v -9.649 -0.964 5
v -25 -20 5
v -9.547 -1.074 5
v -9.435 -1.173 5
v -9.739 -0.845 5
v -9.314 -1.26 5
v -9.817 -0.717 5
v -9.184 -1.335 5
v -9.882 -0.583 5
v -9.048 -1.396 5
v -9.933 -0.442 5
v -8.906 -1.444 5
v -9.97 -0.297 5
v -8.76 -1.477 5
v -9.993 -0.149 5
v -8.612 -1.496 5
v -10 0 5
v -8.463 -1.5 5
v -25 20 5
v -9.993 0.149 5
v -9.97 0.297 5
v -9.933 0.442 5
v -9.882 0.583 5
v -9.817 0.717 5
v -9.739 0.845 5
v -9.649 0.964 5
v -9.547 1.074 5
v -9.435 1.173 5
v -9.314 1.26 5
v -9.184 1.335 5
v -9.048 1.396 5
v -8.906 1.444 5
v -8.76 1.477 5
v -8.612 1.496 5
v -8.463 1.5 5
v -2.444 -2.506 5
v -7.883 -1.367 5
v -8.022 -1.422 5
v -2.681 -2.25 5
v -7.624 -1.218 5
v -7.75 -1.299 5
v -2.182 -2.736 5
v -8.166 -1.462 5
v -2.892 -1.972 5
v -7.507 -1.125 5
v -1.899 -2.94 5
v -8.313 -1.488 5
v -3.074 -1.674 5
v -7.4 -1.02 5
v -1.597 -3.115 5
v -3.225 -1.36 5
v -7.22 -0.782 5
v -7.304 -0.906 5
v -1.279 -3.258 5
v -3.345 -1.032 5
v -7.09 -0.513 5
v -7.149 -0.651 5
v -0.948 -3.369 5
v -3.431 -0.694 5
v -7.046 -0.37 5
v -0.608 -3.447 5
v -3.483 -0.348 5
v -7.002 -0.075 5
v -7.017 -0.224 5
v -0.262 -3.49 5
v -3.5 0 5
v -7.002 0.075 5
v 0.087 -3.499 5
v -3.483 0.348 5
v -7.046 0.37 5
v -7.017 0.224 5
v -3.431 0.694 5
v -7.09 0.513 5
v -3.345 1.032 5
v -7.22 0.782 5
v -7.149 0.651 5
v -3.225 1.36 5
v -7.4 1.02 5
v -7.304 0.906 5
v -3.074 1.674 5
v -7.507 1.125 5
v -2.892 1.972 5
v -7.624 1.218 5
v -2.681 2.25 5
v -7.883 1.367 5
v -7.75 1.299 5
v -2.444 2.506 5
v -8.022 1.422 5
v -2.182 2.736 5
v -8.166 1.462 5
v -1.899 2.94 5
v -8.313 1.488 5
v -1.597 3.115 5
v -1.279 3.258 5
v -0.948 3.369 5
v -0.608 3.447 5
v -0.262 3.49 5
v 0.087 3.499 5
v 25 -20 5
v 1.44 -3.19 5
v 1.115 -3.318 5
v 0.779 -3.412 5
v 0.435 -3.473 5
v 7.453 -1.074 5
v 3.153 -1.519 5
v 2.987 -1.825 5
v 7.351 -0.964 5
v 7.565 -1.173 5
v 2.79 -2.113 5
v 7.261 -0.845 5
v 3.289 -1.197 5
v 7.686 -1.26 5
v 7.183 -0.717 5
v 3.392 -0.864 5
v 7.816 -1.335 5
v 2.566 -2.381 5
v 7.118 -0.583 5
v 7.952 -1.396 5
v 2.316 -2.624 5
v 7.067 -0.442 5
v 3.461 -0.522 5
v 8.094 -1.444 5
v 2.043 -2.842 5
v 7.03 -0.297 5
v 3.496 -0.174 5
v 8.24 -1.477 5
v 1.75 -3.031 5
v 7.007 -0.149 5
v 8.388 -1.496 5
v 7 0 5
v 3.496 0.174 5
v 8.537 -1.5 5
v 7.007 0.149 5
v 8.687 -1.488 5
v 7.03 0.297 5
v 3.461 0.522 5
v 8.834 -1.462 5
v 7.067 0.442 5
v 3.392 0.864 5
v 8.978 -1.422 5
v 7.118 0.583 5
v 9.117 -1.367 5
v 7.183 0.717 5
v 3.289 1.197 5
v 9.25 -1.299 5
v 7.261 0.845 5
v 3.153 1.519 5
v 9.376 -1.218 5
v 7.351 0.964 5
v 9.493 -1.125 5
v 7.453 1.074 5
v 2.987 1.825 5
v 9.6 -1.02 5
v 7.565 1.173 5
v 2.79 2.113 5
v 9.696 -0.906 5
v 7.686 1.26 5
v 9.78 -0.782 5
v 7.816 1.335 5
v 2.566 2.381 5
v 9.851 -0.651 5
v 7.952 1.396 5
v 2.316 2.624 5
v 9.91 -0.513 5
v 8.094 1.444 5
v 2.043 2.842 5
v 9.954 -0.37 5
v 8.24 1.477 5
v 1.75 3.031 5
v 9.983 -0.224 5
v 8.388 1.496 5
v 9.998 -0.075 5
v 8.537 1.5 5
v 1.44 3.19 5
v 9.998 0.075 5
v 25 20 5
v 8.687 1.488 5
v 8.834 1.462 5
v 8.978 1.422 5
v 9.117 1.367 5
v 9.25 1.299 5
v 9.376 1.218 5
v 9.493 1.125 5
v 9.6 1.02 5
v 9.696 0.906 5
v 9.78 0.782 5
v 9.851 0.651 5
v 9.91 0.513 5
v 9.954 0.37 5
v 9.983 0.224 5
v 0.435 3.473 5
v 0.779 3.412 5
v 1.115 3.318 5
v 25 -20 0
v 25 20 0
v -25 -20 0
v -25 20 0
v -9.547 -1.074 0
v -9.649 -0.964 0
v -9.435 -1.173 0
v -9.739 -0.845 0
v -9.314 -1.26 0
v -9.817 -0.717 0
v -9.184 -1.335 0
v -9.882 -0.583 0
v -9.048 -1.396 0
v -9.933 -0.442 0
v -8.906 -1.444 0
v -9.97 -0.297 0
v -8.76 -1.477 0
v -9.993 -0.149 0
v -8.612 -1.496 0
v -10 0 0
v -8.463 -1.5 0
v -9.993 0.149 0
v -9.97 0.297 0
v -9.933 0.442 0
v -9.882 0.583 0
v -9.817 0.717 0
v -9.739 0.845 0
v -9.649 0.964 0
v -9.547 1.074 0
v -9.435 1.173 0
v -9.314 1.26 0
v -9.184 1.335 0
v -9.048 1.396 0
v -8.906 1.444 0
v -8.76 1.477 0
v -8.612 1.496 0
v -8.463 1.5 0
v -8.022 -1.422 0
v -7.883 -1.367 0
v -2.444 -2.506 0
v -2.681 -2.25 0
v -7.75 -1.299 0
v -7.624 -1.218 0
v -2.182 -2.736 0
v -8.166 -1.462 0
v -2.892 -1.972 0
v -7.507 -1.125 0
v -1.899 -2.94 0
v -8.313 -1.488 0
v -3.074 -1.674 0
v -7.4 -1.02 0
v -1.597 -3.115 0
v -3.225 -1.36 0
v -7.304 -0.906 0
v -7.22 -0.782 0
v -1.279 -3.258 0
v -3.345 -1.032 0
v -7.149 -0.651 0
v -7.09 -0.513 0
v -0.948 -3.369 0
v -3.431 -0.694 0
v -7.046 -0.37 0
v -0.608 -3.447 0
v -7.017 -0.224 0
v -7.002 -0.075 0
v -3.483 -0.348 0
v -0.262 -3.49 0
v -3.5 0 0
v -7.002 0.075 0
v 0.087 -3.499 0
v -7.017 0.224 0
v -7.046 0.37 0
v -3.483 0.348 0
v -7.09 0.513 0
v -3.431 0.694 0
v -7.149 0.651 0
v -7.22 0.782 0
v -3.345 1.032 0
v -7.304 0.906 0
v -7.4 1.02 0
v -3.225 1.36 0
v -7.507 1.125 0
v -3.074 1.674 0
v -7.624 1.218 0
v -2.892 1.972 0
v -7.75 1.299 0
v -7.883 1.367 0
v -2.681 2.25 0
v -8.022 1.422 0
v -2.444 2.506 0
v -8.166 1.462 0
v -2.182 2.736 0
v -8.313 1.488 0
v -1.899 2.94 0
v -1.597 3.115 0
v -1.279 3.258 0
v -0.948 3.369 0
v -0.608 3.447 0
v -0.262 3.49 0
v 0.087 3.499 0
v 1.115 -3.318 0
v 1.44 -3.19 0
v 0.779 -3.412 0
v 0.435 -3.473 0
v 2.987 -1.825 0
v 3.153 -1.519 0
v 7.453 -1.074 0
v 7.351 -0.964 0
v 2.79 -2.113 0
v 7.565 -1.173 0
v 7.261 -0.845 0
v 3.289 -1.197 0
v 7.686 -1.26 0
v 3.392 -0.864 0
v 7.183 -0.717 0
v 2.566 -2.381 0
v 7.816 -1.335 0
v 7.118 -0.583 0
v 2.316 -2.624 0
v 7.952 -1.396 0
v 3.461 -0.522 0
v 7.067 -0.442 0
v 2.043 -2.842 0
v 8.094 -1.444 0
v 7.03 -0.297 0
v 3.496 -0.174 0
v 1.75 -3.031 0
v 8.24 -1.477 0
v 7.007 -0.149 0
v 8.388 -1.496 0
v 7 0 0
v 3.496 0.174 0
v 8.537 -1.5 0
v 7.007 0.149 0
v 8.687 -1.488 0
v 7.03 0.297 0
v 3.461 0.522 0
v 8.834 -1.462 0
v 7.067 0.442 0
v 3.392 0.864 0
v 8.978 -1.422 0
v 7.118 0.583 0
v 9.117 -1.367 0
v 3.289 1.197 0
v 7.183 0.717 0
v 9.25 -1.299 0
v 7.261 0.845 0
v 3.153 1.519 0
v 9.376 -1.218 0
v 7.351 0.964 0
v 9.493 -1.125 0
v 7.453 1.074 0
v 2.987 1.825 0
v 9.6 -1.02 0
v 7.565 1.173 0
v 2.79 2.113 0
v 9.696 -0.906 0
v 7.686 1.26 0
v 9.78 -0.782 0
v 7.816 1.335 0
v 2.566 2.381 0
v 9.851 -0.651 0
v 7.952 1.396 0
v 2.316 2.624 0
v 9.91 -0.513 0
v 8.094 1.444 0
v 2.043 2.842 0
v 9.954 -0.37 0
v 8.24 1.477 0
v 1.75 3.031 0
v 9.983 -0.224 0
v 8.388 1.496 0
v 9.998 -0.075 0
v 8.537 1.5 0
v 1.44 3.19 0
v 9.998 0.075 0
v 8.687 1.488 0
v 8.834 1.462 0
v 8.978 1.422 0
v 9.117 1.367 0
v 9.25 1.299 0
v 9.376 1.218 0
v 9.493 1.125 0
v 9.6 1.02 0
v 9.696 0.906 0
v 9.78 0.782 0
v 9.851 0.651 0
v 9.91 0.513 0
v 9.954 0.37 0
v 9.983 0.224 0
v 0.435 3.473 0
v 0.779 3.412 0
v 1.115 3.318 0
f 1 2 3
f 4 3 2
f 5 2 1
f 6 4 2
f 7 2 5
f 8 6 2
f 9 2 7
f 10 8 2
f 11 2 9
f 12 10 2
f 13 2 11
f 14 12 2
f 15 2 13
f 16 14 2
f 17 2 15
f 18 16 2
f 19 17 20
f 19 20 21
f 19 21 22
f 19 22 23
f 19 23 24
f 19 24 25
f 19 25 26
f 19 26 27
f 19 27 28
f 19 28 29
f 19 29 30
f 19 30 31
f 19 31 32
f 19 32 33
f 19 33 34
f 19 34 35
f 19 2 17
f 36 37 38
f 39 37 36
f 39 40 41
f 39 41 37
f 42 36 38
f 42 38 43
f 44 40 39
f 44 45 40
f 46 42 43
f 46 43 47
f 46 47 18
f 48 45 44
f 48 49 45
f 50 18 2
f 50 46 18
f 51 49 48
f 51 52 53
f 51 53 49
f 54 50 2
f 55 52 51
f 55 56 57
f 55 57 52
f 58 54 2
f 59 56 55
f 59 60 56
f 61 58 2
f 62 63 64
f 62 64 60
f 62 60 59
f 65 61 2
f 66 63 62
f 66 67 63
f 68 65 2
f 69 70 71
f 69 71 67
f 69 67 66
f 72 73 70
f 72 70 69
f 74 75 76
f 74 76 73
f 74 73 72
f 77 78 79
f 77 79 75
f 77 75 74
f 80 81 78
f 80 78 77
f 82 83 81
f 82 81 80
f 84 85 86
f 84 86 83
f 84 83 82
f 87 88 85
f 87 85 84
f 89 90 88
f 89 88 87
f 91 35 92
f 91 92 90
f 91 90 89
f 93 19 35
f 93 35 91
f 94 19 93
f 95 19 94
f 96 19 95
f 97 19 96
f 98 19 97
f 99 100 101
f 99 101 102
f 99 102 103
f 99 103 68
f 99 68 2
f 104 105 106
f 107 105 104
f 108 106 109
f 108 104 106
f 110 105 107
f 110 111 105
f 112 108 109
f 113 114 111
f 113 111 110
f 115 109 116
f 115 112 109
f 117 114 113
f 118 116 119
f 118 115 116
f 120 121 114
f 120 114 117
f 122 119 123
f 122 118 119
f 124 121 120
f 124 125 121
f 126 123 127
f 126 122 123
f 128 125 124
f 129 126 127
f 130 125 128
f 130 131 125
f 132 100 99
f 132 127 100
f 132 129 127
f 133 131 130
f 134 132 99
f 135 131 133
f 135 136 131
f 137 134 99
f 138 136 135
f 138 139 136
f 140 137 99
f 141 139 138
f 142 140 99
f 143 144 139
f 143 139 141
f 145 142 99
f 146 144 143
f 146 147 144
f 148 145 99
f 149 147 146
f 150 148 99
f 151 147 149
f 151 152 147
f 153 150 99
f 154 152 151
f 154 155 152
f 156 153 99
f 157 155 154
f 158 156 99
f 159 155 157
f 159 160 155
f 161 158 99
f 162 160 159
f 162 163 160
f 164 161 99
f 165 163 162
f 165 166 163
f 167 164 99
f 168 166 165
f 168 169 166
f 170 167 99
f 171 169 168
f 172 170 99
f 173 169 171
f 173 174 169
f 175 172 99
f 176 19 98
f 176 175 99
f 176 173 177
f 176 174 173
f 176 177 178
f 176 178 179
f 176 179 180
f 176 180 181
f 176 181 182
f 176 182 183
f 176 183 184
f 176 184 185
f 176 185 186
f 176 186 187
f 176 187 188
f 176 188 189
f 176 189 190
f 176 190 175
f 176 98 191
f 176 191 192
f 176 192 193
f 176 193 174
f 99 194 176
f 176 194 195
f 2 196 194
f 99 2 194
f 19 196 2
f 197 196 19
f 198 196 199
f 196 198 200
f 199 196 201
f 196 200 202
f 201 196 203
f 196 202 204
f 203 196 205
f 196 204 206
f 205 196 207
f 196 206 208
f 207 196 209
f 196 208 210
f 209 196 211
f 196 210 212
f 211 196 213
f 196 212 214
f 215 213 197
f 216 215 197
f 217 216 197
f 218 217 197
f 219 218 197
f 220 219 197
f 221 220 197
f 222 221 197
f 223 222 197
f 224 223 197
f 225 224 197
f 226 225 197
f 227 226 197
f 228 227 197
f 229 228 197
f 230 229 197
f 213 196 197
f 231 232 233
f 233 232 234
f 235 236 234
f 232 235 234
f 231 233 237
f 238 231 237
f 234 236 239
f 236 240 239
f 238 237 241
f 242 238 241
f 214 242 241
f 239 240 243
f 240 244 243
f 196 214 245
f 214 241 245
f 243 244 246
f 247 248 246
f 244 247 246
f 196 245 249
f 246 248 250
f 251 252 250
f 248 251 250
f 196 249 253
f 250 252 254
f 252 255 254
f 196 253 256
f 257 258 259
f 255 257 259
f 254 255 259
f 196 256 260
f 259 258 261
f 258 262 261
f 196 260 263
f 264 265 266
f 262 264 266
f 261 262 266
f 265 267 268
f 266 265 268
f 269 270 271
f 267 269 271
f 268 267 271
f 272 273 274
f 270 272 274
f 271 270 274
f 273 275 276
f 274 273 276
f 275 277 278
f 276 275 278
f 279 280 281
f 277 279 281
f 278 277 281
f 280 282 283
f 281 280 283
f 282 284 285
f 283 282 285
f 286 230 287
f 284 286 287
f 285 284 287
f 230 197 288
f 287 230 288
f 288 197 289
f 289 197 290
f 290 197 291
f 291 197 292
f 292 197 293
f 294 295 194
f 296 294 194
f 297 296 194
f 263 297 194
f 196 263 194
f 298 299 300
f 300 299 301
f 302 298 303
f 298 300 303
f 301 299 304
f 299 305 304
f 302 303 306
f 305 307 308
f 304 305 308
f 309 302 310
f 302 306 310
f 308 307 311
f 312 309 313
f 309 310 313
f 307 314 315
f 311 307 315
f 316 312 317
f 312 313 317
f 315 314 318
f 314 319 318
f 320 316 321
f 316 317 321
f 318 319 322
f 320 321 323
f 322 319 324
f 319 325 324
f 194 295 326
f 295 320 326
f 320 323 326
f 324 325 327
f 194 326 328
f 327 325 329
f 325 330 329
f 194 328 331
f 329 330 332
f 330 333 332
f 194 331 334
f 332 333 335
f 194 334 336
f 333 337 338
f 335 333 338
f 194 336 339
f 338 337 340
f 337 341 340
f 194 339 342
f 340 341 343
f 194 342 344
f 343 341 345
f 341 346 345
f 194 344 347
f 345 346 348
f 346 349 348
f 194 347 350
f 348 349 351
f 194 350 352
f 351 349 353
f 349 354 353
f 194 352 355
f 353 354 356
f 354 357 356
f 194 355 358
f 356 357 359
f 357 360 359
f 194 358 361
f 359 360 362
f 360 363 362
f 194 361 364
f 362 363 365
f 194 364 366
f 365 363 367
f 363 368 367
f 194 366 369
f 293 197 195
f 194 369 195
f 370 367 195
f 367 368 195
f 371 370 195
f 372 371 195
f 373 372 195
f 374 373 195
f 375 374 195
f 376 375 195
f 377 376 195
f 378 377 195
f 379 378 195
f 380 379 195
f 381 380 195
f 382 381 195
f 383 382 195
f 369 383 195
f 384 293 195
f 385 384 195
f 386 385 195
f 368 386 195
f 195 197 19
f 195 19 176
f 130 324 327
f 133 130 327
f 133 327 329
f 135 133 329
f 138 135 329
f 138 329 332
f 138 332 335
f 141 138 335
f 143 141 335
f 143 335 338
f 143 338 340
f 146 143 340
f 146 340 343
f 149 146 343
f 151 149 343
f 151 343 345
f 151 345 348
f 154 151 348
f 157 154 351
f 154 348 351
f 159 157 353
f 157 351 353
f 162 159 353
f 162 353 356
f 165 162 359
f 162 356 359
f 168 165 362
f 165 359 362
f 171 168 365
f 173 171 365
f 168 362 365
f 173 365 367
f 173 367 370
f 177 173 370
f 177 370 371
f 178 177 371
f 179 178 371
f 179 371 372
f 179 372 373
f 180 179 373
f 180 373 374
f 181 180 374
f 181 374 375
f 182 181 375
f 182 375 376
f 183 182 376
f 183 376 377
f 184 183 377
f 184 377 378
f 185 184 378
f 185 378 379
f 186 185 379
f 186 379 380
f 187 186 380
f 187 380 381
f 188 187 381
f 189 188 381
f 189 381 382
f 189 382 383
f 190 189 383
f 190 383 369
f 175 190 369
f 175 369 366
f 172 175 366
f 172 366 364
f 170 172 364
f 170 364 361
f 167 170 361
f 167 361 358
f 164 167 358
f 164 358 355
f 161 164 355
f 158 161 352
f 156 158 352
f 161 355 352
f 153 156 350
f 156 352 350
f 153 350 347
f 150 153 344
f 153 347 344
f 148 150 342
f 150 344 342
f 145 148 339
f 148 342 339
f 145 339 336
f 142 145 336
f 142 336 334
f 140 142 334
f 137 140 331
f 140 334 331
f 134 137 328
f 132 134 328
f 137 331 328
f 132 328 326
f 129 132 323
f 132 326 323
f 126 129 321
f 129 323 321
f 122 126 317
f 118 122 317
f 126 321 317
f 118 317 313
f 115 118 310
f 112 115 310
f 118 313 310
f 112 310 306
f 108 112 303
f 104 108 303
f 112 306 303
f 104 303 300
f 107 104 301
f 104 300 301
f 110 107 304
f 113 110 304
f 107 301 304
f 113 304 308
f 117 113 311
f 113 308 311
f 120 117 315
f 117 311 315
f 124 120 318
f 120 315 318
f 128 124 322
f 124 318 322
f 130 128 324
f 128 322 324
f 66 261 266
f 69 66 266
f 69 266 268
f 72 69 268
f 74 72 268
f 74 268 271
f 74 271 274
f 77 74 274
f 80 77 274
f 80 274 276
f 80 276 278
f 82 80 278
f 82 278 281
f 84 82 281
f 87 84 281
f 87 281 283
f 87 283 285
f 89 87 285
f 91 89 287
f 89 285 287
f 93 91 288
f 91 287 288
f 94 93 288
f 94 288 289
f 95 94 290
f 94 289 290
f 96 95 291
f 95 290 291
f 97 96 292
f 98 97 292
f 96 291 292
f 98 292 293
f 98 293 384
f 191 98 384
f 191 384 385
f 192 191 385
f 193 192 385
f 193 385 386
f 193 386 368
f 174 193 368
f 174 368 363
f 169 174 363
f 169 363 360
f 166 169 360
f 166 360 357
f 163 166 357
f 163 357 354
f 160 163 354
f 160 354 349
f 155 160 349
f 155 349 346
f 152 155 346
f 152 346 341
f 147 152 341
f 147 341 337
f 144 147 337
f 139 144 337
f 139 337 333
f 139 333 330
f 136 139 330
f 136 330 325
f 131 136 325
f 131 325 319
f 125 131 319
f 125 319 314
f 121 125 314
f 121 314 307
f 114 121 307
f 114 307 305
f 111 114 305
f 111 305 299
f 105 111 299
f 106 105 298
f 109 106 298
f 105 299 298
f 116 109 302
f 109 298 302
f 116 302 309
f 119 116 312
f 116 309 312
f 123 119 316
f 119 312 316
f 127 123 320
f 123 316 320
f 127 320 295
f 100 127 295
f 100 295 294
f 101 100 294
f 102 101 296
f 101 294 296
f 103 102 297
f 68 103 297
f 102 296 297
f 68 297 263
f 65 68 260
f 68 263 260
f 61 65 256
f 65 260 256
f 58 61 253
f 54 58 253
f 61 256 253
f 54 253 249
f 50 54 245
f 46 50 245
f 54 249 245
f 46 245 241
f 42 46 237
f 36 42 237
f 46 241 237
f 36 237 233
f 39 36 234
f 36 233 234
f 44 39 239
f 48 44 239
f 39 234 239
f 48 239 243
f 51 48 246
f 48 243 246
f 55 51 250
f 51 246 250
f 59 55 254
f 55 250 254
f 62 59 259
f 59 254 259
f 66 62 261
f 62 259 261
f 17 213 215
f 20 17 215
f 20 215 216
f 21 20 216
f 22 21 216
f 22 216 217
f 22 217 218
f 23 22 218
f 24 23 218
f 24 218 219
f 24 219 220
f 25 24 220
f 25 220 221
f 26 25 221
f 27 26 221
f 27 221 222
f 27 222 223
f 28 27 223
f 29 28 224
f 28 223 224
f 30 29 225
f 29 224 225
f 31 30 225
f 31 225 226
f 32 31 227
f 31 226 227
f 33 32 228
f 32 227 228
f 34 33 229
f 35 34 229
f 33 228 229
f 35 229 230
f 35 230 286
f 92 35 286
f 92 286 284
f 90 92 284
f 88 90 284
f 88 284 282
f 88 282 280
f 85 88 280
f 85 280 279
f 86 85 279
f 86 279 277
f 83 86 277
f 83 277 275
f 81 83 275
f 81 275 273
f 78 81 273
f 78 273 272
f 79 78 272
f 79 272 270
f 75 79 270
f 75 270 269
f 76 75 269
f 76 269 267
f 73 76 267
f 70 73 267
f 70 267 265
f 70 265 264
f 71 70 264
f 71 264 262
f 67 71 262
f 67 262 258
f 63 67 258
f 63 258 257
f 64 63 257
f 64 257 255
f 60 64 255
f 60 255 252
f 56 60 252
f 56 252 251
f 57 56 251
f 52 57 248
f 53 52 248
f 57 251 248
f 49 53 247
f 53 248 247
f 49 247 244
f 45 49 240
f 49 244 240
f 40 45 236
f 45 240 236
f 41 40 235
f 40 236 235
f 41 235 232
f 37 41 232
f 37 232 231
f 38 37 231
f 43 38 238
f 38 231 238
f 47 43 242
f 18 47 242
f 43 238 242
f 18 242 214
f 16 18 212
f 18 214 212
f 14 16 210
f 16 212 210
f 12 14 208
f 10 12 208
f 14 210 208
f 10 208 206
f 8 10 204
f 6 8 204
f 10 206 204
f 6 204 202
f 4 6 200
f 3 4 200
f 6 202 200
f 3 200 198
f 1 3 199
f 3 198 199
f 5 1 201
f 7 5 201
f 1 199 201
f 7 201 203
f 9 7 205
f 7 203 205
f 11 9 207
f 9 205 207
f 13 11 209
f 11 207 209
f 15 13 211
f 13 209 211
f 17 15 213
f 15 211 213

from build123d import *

# Parameters (mm, degrees)
ESQUISSE1_W             = 50
ESQUISSE1_H             = 40
BOSS_EXTRU_1_DEPTH      = 5
ESQUISSE2_R             = 1.5
ESQUISSE2_R_2           = 3.5
ENL_V_MAT_EXTRU_1_DEPTH = 10


with BuildPart() as part:
    # Esquisse1 → Boss.-Extru.1 (new body)
    with BuildSketch(Plane.XY):
        Rectangle(ESQUISSE1_W, ESQUISSE1_H)
    extrude(amount=BOSS_EXTRU_1_DEPTH)

    # Esquisse2 → Enlèv. mat.-Extru.1 (cut)
    with BuildSketch(Plane(origin=(0, 0, 0), x_dir=(-1, 0, 0), z_dir=(0, 0, -1))):
        with Locations((-8.5, 0)):
            Circle(ESQUISSE2_R)
        with Locations((8.5, 0)):
            Circle(ESQUISSE2_R)
        Circle(ESQUISSE2_R_2)
    extrude(amount=-ENL_V_MAT_EXTRU_1_DEPTH, mode=Mode.SUBTRACT)


solid = part.part
